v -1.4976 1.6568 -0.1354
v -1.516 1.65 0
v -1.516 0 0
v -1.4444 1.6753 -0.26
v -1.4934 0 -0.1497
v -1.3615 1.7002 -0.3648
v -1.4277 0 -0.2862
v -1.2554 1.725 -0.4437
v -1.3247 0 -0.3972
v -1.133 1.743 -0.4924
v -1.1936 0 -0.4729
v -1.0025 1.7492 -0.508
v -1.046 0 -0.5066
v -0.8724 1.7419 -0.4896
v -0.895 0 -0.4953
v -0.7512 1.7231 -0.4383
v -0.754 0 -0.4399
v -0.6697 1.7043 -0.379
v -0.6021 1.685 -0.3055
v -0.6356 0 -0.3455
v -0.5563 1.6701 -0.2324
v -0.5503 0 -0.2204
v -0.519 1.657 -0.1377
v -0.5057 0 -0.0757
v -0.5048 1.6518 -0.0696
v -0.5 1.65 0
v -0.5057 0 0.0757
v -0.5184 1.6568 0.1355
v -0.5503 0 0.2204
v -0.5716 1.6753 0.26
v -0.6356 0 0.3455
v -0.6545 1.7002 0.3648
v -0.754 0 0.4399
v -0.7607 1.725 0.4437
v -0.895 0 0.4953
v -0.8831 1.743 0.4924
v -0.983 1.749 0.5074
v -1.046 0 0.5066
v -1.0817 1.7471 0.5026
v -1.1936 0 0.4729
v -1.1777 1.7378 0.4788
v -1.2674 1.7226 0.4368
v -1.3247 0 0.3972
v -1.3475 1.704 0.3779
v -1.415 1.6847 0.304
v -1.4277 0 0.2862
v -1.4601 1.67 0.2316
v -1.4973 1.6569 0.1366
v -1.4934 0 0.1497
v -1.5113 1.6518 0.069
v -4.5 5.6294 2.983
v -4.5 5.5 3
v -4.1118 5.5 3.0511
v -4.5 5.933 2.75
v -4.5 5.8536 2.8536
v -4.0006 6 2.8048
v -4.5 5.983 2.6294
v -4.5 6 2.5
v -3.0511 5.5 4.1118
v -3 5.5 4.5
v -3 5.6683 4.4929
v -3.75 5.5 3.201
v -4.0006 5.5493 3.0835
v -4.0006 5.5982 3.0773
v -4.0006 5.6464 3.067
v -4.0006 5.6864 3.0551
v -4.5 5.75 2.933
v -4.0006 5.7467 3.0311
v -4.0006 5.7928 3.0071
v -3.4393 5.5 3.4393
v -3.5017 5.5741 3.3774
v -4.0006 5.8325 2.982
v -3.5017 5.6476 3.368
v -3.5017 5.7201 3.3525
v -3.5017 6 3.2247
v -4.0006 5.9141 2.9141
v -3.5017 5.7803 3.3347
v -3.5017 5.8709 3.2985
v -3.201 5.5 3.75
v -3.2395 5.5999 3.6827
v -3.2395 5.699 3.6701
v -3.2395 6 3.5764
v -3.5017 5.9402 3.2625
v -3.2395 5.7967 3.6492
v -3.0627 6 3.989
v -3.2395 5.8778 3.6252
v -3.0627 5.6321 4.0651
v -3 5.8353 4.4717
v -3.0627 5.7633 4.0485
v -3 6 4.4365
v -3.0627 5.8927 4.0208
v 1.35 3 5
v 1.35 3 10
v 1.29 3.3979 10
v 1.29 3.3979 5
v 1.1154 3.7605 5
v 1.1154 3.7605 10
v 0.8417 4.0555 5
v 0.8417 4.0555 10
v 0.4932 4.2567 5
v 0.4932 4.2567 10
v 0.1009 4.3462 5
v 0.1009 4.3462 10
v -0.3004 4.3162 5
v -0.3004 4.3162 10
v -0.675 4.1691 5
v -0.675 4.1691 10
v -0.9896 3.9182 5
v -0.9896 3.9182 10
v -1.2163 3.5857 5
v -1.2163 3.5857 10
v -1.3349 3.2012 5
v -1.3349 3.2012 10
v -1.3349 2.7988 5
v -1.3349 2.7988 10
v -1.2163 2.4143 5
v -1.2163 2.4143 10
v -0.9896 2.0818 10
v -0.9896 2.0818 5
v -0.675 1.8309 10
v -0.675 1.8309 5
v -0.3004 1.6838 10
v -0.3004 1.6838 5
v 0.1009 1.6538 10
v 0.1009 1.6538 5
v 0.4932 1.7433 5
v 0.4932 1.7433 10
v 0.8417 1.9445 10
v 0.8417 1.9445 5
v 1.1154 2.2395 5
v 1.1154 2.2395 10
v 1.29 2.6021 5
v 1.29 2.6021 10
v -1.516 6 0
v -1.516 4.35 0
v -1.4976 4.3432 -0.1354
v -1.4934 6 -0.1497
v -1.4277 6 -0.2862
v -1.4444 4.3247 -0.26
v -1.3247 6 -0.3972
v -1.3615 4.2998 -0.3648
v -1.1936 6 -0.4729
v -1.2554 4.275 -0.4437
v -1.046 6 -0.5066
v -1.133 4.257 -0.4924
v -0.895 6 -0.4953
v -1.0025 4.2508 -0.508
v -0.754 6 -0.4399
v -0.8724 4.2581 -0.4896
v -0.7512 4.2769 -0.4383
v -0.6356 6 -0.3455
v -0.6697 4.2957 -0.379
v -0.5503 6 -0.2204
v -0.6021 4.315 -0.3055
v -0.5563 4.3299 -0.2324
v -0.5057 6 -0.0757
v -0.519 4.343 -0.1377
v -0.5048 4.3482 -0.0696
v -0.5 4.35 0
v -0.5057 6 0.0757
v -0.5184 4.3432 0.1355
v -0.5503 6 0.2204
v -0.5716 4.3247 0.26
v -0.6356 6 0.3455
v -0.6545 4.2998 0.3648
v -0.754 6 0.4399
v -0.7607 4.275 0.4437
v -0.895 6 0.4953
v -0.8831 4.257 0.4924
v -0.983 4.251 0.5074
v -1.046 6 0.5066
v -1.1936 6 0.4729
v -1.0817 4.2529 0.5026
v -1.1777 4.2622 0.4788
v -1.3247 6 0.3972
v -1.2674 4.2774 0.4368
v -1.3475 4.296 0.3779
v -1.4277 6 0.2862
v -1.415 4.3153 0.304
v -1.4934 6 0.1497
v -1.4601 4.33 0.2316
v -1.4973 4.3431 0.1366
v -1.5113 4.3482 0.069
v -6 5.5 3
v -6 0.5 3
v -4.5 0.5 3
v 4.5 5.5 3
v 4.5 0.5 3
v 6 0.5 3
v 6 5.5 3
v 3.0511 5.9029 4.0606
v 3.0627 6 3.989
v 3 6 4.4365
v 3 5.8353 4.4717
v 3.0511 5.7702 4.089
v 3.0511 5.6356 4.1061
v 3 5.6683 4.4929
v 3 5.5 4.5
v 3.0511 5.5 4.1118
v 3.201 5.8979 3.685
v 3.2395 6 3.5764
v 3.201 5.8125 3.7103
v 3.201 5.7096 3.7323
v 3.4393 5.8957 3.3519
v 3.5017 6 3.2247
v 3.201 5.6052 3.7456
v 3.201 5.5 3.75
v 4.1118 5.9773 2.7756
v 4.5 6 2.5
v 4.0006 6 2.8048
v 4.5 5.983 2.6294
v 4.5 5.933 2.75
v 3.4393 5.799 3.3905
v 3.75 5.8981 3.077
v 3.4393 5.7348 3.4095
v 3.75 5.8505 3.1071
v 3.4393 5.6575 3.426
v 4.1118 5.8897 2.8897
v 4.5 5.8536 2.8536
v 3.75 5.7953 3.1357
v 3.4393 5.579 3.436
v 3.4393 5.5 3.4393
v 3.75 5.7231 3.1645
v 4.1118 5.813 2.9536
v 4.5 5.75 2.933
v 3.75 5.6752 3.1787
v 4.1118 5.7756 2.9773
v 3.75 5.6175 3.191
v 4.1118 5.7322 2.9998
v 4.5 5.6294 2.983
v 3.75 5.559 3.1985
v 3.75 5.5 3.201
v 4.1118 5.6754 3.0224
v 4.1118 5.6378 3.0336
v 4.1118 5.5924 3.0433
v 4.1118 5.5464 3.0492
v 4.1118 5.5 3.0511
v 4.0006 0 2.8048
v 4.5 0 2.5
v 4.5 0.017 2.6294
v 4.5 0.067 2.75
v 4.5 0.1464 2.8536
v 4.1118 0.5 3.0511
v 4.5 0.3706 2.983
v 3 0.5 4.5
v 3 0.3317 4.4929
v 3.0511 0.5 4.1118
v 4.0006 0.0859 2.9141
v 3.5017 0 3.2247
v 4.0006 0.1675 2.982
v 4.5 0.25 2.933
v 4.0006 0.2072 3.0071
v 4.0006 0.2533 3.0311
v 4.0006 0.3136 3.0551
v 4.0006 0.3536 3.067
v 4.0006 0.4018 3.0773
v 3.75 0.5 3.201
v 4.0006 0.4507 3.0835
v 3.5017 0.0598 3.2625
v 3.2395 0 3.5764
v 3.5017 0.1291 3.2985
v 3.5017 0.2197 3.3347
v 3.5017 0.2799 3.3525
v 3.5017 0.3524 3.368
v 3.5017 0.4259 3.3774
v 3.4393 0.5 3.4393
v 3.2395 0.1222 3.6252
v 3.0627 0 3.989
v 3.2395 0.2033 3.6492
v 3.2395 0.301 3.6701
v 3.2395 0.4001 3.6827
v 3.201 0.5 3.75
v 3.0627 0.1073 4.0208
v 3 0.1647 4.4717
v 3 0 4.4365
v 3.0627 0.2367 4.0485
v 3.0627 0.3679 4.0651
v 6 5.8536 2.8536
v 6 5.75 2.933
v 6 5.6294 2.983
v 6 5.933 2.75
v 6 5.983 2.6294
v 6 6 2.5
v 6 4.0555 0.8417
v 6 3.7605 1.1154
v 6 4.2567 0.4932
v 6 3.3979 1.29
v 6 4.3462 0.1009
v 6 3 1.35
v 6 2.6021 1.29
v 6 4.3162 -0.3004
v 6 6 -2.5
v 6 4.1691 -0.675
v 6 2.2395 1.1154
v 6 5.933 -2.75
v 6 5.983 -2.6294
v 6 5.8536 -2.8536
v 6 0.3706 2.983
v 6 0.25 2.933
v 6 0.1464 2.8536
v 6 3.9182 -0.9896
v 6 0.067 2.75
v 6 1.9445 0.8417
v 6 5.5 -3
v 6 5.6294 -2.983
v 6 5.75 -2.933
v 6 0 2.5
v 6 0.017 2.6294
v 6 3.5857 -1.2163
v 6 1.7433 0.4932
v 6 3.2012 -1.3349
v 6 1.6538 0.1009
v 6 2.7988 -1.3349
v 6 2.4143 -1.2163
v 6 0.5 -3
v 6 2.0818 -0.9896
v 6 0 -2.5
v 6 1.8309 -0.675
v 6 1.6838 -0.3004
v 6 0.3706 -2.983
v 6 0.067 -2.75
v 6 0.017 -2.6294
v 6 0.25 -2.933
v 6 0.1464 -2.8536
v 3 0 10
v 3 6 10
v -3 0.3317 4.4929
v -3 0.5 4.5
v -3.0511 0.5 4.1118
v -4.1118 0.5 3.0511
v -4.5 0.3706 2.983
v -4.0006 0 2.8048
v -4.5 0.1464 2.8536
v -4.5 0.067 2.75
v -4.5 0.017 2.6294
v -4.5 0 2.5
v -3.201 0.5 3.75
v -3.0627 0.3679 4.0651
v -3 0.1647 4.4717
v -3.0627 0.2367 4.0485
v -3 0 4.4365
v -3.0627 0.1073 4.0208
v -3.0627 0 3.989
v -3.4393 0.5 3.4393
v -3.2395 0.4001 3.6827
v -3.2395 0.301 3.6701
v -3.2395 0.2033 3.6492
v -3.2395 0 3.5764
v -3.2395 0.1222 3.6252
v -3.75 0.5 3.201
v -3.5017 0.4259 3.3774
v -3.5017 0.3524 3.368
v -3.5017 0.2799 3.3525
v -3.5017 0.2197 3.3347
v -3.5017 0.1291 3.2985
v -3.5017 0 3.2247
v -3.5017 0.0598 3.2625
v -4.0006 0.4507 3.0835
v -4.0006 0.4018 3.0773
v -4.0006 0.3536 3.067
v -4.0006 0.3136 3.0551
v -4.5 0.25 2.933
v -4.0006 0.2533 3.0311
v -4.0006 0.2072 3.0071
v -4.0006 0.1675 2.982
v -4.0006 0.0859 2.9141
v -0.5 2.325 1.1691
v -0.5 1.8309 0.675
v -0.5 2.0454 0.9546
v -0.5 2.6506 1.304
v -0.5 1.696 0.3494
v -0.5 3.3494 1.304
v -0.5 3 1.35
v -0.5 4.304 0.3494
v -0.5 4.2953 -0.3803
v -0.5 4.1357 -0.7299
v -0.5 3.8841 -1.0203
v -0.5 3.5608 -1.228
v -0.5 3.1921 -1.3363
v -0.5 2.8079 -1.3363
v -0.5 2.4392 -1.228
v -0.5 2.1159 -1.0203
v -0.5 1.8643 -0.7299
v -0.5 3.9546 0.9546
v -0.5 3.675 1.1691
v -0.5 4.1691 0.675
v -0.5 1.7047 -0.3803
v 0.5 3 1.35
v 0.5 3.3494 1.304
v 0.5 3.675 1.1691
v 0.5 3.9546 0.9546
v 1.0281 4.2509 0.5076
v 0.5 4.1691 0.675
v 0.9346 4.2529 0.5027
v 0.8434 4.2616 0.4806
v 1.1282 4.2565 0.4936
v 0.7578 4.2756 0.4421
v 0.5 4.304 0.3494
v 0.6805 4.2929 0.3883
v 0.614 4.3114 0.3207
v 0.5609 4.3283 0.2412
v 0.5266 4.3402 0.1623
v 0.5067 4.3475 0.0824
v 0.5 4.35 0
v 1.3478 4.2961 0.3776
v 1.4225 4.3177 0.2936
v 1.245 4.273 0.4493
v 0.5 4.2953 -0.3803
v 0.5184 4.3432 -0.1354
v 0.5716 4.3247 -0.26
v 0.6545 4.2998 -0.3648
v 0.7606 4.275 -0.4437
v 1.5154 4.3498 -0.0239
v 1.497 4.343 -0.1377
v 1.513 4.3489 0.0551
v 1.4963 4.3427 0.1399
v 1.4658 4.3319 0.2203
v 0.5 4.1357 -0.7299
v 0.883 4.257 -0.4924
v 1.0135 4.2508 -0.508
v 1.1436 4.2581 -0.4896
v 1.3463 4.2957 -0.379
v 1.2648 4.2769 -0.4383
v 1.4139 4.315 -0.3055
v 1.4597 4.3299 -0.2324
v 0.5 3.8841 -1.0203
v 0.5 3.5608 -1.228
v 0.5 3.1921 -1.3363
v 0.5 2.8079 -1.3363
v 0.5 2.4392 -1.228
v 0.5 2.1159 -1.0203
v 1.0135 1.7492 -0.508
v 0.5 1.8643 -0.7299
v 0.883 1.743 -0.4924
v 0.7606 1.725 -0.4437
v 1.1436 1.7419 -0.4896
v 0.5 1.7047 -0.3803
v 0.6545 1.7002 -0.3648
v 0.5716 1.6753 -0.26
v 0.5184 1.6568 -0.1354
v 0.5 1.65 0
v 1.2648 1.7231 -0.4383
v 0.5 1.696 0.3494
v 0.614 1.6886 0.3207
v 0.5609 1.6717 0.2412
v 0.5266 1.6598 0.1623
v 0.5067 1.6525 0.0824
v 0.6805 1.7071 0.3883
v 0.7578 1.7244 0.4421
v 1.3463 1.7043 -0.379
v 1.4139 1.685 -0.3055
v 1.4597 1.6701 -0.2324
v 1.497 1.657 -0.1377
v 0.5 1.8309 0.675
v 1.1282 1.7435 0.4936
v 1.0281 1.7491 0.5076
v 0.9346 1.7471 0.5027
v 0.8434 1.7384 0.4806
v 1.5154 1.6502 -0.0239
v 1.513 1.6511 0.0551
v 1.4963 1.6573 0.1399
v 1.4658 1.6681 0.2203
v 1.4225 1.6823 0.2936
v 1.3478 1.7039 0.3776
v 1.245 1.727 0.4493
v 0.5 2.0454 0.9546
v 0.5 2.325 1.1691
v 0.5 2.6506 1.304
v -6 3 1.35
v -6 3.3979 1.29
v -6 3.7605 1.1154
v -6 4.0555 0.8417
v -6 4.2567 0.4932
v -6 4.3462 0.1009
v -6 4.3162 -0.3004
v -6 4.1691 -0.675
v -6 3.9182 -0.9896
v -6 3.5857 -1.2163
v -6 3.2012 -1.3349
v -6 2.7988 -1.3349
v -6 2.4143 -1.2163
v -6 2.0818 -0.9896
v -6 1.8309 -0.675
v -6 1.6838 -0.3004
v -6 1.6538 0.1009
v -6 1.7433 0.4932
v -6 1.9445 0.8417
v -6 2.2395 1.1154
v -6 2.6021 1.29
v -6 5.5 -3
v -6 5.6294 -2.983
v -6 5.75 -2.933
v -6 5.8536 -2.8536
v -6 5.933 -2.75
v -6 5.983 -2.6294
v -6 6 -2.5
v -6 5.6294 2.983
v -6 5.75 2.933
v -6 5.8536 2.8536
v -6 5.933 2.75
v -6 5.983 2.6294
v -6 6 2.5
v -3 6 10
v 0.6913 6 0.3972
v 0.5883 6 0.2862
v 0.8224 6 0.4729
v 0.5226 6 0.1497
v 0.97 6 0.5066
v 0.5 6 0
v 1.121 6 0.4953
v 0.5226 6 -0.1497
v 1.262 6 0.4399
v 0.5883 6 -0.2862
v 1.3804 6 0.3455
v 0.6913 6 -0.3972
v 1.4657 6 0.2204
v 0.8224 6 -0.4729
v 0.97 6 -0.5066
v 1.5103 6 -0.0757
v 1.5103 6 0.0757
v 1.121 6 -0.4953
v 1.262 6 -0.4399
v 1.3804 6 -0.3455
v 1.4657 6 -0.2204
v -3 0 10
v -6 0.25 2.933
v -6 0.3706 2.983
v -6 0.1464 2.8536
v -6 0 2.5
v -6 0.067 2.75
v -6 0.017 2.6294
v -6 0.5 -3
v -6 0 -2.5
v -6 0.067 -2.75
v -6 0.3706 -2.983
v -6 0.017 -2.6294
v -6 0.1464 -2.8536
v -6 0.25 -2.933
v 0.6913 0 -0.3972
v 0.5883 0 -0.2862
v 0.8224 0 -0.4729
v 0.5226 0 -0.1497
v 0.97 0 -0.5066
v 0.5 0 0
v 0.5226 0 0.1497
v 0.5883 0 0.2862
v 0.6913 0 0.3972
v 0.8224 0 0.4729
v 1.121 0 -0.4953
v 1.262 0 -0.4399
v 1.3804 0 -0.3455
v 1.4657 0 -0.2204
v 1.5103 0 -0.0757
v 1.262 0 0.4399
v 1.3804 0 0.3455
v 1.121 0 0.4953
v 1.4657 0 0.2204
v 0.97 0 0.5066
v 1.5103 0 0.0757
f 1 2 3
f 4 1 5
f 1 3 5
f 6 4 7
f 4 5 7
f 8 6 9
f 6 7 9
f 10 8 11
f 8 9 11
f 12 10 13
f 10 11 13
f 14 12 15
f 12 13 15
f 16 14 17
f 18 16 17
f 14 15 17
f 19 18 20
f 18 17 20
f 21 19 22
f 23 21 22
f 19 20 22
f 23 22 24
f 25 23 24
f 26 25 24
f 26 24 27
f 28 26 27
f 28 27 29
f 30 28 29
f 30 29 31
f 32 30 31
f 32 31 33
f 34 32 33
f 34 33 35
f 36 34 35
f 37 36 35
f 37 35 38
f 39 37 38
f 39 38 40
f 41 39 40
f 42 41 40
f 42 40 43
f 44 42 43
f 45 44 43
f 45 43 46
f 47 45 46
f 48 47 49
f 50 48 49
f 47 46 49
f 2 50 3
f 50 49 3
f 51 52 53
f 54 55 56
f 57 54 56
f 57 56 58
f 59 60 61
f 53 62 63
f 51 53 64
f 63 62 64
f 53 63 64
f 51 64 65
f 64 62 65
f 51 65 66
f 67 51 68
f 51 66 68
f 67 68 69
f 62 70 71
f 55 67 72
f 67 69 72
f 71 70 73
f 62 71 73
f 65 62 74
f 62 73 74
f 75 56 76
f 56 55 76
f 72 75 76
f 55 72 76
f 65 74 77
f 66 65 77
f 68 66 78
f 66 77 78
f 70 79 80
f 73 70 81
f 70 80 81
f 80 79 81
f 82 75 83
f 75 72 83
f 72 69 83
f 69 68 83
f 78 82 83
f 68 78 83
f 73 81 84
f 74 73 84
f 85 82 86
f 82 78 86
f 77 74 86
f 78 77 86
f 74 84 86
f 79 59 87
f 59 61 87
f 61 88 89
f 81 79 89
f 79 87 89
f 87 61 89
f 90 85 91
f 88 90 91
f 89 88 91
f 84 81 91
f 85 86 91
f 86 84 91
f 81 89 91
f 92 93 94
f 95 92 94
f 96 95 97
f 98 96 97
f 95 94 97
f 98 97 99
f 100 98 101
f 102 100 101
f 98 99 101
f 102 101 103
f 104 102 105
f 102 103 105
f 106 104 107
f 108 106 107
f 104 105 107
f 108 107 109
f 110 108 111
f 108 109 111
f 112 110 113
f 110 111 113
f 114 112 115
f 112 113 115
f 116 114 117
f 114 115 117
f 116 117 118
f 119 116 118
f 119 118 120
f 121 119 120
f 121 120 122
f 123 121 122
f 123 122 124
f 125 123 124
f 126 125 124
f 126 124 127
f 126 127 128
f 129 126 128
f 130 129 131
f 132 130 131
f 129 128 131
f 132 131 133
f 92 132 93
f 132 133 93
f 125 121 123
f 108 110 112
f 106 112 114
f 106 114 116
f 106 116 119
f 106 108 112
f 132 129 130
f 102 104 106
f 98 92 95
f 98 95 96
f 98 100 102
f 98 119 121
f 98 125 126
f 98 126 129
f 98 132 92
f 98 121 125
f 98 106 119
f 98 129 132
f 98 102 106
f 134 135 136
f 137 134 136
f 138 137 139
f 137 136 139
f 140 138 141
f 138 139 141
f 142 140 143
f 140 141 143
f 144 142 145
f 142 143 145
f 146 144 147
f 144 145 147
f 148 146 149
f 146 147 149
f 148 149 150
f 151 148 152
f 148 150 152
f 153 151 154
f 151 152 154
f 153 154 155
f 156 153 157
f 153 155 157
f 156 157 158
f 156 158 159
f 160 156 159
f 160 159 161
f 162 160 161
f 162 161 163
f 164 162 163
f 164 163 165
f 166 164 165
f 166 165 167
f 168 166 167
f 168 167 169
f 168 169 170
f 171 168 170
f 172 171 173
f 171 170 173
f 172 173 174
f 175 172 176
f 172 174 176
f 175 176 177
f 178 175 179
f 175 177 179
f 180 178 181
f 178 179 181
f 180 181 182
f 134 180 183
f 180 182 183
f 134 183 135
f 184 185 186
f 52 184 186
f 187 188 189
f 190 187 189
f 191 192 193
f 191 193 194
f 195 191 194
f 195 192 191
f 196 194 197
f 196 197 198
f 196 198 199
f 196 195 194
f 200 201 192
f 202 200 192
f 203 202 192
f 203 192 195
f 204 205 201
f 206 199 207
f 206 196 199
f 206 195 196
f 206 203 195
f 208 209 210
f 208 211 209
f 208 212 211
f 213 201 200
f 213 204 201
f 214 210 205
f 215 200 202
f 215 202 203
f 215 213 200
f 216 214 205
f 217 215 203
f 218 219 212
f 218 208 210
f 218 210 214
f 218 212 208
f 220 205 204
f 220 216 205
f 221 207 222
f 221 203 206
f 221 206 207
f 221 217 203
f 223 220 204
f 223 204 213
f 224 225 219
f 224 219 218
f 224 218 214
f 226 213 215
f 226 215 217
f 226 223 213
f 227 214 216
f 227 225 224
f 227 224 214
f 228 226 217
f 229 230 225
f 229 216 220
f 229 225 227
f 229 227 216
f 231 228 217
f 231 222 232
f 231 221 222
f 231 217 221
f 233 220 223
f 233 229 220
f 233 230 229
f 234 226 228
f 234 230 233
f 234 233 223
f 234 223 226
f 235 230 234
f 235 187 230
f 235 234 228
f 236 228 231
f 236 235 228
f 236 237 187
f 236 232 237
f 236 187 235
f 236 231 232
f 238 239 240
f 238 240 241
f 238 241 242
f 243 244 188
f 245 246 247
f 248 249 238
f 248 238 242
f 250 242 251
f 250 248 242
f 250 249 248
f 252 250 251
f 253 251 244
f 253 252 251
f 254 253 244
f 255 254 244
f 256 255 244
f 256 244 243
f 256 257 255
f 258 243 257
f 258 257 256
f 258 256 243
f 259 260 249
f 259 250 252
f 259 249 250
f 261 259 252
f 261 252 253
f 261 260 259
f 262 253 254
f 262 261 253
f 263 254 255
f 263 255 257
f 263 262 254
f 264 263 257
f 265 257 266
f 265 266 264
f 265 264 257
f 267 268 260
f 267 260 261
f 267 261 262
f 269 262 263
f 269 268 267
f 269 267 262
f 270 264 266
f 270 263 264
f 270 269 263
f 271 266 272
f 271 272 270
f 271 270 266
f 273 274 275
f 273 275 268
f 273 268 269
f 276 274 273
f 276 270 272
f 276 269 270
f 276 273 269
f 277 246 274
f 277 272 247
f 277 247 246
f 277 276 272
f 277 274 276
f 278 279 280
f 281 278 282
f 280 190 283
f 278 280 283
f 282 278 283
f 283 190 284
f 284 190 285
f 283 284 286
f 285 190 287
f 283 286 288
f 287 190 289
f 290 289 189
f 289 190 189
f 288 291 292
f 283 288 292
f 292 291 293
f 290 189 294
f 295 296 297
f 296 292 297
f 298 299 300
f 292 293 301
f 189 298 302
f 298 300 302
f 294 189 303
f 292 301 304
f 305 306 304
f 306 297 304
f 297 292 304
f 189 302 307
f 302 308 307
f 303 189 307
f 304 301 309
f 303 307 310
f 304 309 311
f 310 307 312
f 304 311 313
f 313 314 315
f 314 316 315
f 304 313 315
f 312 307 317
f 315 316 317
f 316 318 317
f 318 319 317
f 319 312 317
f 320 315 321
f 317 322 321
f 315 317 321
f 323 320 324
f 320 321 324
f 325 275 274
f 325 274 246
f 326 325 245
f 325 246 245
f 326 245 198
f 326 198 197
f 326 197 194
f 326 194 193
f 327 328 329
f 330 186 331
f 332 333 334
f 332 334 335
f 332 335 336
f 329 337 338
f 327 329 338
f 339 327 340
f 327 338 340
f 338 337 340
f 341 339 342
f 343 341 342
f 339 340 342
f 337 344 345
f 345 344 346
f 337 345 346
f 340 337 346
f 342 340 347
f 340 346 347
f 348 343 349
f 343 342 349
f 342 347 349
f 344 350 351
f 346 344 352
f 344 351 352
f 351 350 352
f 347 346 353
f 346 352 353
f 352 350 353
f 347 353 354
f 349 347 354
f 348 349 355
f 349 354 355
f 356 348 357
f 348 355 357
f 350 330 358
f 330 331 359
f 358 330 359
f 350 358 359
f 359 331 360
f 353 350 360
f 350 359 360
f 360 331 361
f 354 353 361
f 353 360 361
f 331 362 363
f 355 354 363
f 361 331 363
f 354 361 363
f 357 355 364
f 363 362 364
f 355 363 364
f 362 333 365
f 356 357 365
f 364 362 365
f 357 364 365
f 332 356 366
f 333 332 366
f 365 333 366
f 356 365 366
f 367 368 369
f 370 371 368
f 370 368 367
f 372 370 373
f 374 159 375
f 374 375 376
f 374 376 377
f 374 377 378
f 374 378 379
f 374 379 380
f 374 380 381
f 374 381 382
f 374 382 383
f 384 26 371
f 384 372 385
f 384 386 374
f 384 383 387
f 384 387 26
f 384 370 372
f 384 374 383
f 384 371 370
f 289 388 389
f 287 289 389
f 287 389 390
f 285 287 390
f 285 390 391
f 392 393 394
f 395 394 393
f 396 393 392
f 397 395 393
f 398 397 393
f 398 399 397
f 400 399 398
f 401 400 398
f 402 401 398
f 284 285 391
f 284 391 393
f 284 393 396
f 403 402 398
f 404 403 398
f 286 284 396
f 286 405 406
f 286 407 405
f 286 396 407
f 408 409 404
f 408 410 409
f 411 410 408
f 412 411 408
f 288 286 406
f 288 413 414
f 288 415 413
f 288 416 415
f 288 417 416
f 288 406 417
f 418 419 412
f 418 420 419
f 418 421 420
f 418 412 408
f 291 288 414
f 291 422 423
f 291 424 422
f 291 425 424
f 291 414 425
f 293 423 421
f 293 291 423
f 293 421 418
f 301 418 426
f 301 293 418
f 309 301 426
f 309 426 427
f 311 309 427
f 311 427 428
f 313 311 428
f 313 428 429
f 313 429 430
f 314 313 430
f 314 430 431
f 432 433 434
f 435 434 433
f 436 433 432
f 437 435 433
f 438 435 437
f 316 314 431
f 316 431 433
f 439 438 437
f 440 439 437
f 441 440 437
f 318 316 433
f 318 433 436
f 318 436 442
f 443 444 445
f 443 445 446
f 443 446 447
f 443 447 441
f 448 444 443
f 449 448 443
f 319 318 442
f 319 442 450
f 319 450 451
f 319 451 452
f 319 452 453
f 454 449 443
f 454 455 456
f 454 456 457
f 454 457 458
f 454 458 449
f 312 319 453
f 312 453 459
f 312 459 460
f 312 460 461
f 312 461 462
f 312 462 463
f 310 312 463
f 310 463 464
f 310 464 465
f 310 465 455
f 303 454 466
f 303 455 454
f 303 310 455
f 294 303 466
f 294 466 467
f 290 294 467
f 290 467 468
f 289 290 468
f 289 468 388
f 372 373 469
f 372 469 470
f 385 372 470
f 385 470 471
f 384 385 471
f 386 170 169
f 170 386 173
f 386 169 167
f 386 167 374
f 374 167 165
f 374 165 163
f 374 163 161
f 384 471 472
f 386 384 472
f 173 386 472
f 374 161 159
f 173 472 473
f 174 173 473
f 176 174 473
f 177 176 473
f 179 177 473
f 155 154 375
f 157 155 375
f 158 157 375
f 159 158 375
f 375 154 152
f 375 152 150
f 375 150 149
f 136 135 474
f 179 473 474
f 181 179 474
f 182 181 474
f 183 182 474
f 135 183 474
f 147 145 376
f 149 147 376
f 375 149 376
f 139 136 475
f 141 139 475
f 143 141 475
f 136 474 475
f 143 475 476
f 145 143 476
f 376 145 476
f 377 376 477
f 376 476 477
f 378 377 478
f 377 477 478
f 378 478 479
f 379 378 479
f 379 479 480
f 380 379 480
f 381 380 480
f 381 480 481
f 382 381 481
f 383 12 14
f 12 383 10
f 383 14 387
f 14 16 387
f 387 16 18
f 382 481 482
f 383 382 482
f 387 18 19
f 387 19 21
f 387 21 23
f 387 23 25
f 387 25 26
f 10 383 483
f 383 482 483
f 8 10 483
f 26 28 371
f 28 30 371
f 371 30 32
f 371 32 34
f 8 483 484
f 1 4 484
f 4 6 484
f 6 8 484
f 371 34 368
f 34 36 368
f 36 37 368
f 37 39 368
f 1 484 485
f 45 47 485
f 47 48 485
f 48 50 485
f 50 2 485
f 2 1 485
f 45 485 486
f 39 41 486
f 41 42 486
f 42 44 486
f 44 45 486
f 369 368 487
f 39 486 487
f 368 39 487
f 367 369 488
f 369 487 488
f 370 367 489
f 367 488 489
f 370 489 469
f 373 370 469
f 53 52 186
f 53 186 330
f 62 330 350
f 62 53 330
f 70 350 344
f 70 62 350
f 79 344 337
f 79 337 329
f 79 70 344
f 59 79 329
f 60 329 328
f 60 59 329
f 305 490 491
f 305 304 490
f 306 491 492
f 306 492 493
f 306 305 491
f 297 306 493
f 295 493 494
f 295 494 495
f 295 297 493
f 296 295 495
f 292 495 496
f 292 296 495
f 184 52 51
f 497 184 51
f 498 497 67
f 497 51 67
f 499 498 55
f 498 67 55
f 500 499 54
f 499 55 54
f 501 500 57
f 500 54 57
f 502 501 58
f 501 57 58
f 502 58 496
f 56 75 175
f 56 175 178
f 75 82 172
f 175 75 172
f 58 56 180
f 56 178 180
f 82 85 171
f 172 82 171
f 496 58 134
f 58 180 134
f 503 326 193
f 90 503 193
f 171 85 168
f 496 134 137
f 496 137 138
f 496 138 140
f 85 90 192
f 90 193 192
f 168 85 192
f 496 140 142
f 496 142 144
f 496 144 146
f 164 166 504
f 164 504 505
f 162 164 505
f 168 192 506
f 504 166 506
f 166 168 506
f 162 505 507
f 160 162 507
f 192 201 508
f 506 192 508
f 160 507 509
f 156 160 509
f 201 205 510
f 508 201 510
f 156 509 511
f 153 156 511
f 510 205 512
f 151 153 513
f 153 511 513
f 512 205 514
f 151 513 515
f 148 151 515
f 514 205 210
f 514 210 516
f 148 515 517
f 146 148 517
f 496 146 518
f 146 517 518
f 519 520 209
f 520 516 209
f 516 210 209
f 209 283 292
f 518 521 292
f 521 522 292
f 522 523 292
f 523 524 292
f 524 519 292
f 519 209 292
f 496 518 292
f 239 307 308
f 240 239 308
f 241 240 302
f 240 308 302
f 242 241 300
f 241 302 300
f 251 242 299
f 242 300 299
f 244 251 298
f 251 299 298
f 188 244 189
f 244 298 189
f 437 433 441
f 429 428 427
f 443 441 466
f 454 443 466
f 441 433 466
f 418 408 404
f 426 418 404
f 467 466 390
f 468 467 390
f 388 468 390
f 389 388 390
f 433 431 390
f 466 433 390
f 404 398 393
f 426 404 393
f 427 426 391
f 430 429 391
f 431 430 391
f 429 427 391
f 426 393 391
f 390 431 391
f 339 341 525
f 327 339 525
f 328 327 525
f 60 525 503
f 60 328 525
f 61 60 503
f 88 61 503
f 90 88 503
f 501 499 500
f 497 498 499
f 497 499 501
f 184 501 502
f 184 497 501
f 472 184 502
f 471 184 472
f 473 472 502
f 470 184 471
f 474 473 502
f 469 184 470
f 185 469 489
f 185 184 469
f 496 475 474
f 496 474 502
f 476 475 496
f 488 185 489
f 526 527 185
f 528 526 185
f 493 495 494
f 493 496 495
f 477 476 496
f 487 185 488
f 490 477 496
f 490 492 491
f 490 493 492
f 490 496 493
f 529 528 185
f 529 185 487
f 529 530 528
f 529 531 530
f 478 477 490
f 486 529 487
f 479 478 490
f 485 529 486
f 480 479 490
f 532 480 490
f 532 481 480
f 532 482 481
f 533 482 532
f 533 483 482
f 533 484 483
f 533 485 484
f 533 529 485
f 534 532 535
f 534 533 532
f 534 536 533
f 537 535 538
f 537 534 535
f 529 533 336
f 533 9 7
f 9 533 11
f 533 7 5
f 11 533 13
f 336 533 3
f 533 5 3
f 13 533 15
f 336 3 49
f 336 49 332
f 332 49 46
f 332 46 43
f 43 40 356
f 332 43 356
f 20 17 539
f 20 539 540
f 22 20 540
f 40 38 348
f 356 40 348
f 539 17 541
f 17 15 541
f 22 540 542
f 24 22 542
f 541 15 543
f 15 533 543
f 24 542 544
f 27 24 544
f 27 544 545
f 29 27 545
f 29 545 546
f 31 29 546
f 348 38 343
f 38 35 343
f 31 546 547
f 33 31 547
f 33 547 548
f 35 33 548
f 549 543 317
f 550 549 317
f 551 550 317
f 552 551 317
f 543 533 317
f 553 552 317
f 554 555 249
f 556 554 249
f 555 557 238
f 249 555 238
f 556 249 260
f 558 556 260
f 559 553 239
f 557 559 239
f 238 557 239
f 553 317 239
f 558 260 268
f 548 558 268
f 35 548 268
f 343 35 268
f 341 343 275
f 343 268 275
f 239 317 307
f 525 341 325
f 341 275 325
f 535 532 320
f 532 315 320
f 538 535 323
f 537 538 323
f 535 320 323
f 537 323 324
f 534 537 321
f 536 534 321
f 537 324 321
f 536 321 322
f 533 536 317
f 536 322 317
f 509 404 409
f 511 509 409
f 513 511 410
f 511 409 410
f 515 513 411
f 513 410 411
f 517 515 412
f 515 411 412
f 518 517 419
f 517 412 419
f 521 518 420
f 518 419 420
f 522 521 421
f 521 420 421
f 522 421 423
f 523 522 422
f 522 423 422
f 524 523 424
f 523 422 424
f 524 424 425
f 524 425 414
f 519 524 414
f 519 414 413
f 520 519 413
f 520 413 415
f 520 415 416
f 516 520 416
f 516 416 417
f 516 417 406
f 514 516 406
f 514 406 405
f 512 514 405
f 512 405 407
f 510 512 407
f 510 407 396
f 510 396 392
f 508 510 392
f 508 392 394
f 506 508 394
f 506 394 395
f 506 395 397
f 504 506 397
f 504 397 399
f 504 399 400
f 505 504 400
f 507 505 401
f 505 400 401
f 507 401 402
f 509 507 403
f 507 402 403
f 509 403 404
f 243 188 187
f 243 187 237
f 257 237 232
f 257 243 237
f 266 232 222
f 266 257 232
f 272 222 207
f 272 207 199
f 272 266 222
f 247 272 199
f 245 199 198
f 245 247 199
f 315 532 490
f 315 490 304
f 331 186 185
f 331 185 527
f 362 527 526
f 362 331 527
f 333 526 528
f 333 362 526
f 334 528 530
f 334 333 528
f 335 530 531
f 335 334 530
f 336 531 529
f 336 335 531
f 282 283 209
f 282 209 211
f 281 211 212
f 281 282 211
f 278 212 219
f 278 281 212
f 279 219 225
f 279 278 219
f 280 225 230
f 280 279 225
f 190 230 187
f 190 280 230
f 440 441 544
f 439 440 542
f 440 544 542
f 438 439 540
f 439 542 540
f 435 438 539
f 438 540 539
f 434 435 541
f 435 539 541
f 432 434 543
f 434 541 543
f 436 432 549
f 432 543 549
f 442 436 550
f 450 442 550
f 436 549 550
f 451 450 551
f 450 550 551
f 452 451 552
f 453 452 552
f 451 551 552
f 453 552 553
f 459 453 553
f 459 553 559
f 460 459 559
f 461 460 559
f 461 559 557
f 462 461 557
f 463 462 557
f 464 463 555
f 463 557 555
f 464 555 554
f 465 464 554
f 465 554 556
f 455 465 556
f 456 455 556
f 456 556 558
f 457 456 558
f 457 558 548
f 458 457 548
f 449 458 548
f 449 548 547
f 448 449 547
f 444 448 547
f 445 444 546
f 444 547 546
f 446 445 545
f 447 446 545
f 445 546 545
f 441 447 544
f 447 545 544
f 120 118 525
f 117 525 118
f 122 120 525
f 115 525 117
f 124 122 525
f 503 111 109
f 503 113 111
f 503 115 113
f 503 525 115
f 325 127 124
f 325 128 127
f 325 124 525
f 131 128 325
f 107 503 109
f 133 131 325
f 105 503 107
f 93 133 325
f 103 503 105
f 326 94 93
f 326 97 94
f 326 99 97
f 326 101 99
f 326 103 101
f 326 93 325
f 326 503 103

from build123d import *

# Parameters (mm, degrees)
SKETCH1_W                  = 12
SKETCH1_H                  = 6
BOSS_EXTRUDE1_DEPTH        = 6
F_60_0_04_DIAMETER_HOLE1_D = 1.016
SKETCH15_W                 = 6
SKETCH15_H                 = 6
BOSS_EXTRUDE2_DEPTH        = 7
FILLET4_R                  = 0.5
FILLET3_R                  = 1.5
SKETCH19_R                 = 1.35
CUT_EXTRUDE1_DEPTH         = 5.5
SKETCH16_R                 = 1.35
CUT_EXTRUDE2_DEPTH         = 5


with BuildPart() as part:
    # Sketch1 → Boss-Extrude1 (new body)
    with BuildSketch(Plane(origin=(0, 0, 0), x_dir=(1, 0, 0), z_dir=(0, 1, 0))):
        Rectangle(SKETCH1_W, SKETCH1_H)
    extrude(amount=BOSS_EXTRUDE1_DEPTH)

    # #60 (0.04) Diameter Hole1 (through all)
    with Locations(Plane(origin=(0, 6, 0), x_dir=(1, 0, 0), z_dir=(0, 1, 0))):
        with Locations((1.008, 0), (-1.008, 0)):
            Hole(F_60_0_04_DIAMETER_HOLE1_D / 2)

    # Sketch15 → Boss-Extrude2 (add)
    with BuildSketch(Plane.XY.offset(3)):
        with Locations((0, 3)):
            Rectangle(SKETCH15_W, SKETCH15_H)
    extrude(amount=BOSS_EXTRUDE2_DEPTH)

    # Fillet4
    fillet4_edges = [part.edges().sort_by_distance(p)[0] for p in [
        (4.5, 6, 3),
        (4.5, 0, 3),
        (-4.5, 0, 3),
        (0, 0, -3),
        (0, 6, -3),
        (-4.5, 6, 3),
    ]]
    fillet(fillet4_edges, radius=FILLET4_R)

    # Fillet3
    fillet3_edges = [part.edges().sort_by_distance(p)[0] for p in [
        (-3, 3, 3),
        (-3, 0.146446609, 2.853553391),
        (-3, 5.853553391, 2.853553391),
    ]]
    fillet(fillet3_edges, radius=FILLET3_R)
    fillet3_2_edges = [part.edges().sort_by_distance(p)[0] for p in [
        (3, 5.853553391, 2.853553391),
        (3, 3, 3),
        (3, 0.146446609, 2.853553391),
    ]]
    fillet(fillet3_2_edges, radius=FILLET3_R)

    # Sketch19 → Cut-Extrude1 (cut)
    with BuildSketch(Plane.ZY.offset(6)):
        with Locations((0, 3)):
            Circle(SKETCH19_R)
    cut_extrude1 = extrude(amount=-CUT_EXTRUDE1_DEPTH, mode=Mode.SUBTRACT)

    # Sketch16 → Cut-Extrude2 (cut)
    with BuildSketch(Plane.XY.offset(10)):
        with Locations((0, 3)):
            Circle(SKETCH16_R)
    extrude(amount=-CUT_EXTRUDE2_DEPTH, mode=Mode.SUBTRACT)

    # Mirror2: Cut-Extrude1 across plane
    add(cut_extrude1.mirror(Plane(origin=(0, 0, 0), x_dir=(0, 0, 1), z_dir=(1, 0, 0))), mode=Mode.SUBTRACT)


solid = part.part
